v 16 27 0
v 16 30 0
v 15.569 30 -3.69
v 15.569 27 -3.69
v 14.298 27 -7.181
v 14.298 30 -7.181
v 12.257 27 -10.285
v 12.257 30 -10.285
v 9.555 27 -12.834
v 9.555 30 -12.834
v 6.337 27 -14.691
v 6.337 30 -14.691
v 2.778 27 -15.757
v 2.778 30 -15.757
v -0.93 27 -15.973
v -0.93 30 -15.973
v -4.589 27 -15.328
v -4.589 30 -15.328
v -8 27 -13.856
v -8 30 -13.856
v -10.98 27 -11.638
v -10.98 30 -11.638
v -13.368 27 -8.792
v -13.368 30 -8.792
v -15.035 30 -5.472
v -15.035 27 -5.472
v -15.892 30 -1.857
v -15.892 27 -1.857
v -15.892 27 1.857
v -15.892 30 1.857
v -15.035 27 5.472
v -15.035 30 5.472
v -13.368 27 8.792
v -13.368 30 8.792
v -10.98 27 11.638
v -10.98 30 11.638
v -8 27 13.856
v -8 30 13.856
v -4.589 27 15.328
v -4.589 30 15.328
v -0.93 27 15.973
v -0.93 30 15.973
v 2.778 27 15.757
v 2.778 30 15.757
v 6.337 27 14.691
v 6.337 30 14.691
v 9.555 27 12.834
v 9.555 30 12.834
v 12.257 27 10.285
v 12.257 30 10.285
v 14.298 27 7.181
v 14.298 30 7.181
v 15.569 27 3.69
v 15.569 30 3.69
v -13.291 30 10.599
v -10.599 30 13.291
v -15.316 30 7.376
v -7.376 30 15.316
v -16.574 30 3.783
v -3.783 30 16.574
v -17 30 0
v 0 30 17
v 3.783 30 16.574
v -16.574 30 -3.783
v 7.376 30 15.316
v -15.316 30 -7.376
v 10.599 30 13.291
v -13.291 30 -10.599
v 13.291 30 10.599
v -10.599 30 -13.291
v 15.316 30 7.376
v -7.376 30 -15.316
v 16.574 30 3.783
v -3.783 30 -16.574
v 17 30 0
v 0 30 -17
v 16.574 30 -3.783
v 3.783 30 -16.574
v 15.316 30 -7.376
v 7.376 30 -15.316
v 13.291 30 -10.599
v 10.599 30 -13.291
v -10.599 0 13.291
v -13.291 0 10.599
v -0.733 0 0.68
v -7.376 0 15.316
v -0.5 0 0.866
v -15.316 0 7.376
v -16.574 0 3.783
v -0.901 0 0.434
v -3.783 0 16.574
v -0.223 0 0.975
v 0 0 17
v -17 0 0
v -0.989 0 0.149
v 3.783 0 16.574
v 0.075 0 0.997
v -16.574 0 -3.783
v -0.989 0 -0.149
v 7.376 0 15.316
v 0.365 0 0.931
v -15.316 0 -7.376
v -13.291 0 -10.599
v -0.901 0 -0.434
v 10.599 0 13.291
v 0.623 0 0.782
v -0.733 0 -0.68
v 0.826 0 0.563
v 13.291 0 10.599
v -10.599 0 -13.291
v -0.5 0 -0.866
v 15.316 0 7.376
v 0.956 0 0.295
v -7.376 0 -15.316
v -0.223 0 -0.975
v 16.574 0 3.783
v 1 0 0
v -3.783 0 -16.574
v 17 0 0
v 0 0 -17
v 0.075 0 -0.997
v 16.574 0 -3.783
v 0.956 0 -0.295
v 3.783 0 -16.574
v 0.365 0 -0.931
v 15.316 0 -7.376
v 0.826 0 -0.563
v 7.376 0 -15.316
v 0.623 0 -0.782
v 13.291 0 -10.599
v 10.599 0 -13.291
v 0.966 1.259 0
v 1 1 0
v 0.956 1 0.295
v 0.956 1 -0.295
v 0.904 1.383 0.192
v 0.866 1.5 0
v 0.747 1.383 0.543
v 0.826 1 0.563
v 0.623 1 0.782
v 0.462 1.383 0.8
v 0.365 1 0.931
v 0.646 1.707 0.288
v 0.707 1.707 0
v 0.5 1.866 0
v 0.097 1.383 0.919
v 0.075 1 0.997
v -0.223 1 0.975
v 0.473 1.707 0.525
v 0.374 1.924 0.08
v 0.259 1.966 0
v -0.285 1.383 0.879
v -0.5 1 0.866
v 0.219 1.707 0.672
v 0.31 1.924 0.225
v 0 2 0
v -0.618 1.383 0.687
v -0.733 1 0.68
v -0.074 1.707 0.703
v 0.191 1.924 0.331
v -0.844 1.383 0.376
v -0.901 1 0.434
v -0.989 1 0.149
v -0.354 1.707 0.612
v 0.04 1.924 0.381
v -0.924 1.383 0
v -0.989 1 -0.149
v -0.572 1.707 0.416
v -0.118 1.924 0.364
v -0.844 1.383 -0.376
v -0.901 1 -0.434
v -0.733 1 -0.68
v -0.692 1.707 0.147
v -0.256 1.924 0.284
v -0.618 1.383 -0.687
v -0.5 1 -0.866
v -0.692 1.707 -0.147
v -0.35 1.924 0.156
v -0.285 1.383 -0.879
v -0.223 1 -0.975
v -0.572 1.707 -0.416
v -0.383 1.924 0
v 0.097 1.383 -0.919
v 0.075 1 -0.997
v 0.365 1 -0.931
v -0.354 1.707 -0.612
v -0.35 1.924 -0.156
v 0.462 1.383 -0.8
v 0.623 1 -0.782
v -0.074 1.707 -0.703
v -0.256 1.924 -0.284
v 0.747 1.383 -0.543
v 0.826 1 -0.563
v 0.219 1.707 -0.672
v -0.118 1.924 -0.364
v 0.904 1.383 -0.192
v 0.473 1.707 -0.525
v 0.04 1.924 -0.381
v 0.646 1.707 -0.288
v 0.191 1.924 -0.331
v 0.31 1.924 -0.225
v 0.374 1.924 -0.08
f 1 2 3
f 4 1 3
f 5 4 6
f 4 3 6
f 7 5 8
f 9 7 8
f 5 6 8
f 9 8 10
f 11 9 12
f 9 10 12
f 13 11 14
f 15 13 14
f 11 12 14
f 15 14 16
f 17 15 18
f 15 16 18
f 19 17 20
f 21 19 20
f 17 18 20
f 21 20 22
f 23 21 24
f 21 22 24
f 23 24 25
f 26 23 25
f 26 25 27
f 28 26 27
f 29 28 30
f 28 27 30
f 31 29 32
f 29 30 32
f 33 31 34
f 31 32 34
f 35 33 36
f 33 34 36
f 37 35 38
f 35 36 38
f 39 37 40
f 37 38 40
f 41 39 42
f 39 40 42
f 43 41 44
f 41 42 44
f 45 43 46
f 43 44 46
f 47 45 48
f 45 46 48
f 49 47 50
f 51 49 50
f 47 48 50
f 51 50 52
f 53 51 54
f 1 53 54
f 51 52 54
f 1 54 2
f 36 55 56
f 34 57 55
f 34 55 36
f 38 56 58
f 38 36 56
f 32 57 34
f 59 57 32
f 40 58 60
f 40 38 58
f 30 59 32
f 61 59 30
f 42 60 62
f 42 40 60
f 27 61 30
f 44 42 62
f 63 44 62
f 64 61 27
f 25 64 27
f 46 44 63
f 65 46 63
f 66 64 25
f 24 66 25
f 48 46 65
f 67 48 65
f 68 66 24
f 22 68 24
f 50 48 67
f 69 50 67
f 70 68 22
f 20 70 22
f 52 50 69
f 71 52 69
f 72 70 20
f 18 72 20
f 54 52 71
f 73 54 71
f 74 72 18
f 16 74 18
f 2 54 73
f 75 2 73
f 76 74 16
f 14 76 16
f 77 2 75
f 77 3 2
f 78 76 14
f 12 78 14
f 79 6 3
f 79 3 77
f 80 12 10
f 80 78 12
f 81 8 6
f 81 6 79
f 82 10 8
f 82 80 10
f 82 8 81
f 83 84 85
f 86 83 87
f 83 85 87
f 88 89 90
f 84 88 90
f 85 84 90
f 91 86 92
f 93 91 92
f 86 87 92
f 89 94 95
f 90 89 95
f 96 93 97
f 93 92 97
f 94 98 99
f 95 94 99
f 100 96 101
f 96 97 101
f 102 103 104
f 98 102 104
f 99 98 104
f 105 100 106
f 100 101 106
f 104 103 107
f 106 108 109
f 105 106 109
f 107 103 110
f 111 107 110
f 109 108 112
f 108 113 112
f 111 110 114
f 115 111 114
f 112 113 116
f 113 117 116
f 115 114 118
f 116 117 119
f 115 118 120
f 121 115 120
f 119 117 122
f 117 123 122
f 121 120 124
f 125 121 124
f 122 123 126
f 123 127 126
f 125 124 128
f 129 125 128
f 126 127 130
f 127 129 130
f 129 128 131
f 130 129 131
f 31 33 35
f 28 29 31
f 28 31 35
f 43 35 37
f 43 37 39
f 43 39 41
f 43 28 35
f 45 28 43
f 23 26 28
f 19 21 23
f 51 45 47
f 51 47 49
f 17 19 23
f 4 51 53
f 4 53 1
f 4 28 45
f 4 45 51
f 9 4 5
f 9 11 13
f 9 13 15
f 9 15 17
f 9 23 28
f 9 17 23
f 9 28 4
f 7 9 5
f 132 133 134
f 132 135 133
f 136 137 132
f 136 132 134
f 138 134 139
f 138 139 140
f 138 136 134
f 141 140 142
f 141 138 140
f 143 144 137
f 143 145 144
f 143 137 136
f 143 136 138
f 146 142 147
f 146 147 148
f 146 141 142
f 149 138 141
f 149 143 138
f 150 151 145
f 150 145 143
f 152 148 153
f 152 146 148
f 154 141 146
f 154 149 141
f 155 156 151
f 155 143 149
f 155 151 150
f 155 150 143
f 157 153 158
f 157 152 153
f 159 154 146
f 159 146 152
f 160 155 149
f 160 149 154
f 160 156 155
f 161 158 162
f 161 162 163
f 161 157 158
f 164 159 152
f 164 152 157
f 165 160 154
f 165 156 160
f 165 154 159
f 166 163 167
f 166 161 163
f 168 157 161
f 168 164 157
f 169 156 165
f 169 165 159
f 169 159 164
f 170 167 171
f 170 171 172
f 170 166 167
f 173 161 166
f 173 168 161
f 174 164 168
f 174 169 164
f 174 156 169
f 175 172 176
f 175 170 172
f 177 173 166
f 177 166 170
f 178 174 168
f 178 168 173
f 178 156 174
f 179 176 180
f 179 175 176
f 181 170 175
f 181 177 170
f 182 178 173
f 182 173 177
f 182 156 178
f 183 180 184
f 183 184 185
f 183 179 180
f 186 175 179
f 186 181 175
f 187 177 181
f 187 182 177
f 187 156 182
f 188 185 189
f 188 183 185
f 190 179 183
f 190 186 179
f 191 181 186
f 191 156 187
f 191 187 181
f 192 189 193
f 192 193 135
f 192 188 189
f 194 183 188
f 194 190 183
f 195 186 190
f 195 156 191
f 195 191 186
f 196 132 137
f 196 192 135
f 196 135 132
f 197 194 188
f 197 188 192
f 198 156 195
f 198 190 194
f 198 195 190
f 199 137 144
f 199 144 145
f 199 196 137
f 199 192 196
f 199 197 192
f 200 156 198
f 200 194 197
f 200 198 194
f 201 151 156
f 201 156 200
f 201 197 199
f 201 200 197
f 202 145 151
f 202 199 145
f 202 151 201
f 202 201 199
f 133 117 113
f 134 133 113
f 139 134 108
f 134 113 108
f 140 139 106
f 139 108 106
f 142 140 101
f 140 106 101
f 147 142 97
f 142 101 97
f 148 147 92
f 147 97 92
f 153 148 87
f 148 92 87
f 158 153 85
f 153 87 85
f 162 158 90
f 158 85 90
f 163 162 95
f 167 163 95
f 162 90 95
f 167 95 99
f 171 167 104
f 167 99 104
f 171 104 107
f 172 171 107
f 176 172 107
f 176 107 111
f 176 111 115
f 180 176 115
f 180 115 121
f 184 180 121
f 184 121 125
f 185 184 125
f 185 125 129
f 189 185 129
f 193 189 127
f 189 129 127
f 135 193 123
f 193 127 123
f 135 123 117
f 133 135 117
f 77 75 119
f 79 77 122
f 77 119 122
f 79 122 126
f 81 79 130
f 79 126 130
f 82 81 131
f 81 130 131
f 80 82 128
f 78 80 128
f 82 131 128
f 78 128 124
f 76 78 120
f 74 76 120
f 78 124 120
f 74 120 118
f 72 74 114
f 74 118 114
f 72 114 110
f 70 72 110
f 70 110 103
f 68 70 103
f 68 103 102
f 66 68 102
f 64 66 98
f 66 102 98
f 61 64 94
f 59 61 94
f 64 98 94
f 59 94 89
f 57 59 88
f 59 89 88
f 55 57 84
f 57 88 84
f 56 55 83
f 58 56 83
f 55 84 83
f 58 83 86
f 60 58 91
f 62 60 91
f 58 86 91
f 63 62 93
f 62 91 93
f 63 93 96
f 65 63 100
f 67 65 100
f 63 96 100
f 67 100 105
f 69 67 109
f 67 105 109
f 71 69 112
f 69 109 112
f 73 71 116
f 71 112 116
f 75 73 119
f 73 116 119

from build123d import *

# Parameters (mm, degrees)
SKETCH1_R           = 17
BOSS_EXTRUDE1_DEPTH = 30
SKETCH2_R           = 16
CUT_EXTRUDE1_DEPTH  = 3
SKETCH3_R           = 1
CUT_EXTRUDE2_DEPTH  = 2
FILLET1_R           = 1


with BuildPart() as part:
    # Sketch1 → Boss-Extrude1 (new body)
    with BuildSketch(Plane(origin=(0, 0, 0), x_dir=(1, 0, 0), z_dir=(0, 1, 0))):
        Circle(SKETCH1_R)
    extrude(amount=BOSS_EXTRUDE1_DEPTH)

    # Sketch2 → Cut-Extrude1 (cut)
    with BuildSketch(Plane(origin=(0, 30, 0), x_dir=(1, 0, 0), z_dir=(0, 1, 0))):
        Circle(SKETCH2_R)
    extrude(amount=-CUT_EXTRUDE1_DEPTH, mode=Mode.SUBTRACT)

    # Sketch3 → Cut-Extrude2 (cut)
    with BuildSketch(Plane.XZ):
        Circle(SKETCH3_R)
    extrude(amount=-CUT_EXTRUDE2_DEPTH, mode=Mode.SUBTRACT)

    # Fillet1
    fillet1_edges = [part.edges().sort_by_distance(p)[0] for p in [
        (-1, 2, 0),
    ]]
    fillet(fillet1_edges, radius=FILLET1_R)


solid = part.part
